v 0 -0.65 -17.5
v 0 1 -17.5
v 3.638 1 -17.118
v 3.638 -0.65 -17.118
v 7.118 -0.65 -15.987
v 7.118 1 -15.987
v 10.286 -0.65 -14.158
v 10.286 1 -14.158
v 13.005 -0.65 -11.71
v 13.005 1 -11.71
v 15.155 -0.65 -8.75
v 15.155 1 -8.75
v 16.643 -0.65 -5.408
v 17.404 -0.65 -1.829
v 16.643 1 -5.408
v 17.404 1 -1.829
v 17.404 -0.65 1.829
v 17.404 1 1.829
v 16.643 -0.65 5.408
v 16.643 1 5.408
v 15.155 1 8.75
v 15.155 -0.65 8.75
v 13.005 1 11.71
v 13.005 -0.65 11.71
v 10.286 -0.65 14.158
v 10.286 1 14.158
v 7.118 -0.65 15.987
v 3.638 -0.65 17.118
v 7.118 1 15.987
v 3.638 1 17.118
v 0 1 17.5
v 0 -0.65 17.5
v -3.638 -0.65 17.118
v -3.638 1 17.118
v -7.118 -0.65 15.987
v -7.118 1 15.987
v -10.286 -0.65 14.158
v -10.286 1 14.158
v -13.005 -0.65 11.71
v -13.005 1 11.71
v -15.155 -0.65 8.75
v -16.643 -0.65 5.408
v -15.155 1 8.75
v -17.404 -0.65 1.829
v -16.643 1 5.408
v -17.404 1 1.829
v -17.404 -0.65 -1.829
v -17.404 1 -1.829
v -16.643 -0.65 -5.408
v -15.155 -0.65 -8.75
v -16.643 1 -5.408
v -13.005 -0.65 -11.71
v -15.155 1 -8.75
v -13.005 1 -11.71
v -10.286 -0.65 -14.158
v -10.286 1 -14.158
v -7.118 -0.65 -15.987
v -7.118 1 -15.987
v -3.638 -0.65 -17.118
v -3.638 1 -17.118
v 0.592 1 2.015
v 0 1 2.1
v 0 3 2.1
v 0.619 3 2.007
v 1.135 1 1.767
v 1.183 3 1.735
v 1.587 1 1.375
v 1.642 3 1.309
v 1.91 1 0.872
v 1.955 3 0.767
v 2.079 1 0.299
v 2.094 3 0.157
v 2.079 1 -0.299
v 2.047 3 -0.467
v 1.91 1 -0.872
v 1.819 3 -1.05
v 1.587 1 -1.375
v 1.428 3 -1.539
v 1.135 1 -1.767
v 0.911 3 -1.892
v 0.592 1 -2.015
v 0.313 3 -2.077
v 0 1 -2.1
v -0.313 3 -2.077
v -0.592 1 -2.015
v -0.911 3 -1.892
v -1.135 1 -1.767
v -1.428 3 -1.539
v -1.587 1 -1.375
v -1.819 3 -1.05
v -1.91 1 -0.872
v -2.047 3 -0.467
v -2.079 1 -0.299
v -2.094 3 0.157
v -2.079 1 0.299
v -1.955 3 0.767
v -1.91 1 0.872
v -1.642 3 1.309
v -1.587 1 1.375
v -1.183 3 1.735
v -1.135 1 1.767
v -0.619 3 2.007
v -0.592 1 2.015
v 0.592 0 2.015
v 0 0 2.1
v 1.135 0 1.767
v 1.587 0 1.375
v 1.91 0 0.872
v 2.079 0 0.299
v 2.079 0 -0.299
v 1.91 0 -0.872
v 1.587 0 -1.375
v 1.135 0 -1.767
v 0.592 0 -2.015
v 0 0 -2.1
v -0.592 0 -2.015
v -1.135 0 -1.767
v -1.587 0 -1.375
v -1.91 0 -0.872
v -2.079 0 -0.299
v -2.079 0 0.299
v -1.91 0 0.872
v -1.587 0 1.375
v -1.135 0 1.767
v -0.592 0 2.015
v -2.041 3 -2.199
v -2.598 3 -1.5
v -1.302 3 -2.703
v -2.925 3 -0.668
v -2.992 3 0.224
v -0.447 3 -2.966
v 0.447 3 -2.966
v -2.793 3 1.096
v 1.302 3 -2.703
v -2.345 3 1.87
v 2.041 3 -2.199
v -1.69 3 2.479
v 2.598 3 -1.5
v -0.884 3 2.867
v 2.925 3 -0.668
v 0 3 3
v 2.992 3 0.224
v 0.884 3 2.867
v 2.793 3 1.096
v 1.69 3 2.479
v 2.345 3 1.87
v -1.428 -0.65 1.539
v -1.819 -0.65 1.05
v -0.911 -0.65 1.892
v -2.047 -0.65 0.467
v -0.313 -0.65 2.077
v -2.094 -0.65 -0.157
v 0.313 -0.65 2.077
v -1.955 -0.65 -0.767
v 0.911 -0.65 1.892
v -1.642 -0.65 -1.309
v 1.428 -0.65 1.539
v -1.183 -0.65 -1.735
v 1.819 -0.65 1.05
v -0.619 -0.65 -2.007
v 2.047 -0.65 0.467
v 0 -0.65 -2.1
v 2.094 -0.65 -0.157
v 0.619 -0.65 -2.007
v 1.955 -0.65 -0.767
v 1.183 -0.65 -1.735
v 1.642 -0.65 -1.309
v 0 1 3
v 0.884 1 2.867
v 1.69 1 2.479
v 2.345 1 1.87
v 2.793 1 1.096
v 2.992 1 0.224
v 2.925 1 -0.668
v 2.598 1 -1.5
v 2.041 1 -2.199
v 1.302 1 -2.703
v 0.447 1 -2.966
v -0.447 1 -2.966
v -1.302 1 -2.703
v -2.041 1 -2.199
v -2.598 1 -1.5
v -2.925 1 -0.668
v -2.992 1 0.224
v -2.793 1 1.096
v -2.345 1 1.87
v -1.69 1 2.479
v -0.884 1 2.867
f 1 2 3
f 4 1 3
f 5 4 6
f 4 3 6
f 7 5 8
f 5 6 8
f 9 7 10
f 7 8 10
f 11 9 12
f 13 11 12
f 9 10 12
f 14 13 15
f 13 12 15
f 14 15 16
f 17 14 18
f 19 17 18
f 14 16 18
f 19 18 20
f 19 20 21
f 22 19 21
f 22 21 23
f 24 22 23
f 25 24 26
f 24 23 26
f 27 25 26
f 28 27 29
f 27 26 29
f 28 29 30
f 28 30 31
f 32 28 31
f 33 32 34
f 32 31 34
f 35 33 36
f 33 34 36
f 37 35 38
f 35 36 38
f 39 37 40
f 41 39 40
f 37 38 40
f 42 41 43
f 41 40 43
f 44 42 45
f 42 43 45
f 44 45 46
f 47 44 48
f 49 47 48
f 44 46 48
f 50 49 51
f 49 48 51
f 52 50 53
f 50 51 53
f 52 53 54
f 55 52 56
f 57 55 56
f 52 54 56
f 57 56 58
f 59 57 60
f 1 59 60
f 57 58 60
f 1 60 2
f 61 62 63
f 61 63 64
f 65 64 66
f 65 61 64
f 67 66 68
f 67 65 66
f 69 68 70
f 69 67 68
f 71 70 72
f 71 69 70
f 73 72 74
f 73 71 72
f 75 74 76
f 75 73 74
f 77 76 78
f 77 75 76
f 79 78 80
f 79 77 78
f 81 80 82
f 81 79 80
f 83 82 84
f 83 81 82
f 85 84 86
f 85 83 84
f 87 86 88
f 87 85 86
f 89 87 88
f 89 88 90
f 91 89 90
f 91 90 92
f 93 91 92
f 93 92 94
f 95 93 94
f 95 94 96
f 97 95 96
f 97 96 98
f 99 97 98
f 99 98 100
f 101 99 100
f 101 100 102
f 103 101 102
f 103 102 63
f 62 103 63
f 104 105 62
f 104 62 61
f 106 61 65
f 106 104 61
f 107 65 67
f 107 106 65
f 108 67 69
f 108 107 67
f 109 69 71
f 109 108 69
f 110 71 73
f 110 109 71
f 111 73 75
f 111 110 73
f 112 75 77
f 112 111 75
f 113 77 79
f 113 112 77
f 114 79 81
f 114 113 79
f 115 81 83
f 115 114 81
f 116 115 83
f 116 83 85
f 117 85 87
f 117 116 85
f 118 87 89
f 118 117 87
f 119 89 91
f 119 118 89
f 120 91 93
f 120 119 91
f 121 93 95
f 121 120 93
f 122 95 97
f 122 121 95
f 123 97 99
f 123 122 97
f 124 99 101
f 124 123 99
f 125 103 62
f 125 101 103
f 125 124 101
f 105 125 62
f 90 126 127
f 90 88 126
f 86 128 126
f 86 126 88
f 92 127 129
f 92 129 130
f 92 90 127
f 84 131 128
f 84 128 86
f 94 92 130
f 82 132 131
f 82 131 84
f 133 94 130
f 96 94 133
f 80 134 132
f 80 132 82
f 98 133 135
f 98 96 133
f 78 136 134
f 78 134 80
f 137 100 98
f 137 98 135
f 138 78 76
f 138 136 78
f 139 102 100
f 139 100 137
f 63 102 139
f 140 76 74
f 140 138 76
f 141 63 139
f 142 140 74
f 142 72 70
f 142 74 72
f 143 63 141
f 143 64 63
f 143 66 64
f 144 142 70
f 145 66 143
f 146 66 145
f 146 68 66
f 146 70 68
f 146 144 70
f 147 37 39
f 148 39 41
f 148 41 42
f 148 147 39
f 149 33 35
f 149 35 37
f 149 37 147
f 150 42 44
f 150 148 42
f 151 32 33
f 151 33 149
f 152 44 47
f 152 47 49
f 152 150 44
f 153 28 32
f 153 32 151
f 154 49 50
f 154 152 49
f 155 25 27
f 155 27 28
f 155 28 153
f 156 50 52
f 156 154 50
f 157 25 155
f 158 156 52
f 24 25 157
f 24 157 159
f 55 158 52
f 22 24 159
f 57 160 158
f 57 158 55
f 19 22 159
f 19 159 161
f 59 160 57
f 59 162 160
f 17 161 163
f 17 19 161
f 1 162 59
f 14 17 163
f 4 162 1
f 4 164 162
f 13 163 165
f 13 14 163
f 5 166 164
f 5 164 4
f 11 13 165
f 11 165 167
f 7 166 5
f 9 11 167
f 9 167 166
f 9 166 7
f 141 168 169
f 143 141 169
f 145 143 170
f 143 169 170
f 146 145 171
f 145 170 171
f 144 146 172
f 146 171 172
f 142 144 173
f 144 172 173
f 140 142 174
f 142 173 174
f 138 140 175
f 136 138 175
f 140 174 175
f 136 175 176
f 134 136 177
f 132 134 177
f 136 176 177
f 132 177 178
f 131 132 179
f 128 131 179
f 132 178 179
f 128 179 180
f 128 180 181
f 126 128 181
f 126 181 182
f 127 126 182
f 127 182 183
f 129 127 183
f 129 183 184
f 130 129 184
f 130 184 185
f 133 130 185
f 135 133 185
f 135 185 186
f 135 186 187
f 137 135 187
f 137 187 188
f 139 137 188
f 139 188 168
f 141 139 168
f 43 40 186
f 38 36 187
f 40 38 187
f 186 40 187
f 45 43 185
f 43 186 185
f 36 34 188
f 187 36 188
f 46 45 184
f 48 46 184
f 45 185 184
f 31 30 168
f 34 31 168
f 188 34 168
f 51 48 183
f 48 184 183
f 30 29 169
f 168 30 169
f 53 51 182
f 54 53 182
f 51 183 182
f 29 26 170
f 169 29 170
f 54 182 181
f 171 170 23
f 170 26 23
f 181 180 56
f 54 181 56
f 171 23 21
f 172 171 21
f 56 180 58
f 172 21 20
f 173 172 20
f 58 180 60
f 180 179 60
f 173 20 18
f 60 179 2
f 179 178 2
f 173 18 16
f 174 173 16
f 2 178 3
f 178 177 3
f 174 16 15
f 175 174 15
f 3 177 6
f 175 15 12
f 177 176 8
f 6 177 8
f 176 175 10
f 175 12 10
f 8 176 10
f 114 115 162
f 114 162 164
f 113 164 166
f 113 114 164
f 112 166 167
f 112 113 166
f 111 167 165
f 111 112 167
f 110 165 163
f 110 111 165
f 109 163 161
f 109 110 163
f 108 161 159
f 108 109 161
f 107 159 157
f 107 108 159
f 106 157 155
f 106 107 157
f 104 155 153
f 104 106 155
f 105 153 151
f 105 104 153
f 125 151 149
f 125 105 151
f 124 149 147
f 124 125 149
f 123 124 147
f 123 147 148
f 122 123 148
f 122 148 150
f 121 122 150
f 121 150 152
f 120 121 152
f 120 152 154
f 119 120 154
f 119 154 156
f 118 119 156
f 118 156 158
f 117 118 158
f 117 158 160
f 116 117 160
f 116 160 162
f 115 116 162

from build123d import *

# Parameters (mm, degrees)
SKETCH_1_R           = 3
SKETCH_1_R_2         = 2.1
EXTRUDE_1_DEPTH      = 3
EXTRUDE_2_DEPTH      = 0.65
EXTRUDE_2_DEPTH_BACK = 1
SKETCH_2_R           = 17.5
SKETCH_2_R_2         = 2.1


with BuildPart() as part:
    # ｽｹｯﾁ1 → ﾎﾞｽ - 押し出し1 (new body)
    with BuildSketch(Plane(origin=(0, 0, 0), x_dir=(1, 0, 0), z_dir=(0, 1, 0))):
        with Locations(Location((0, 0, 0), (0, 0, 270))):
            Circle(SKETCH_1_R)
        with Locations(Location((0, 0, 0), (0, 0, 270))):
            Circle(SKETCH_1_R_2, mode=Mode.SUBTRACT)
    extrude(amount=EXTRUDE_1_DEPTH)

    # ｽｹｯﾁ2 → ﾎﾞｽ - 押し出し2 (add, two sides: drawn at the far end of the back side and taken through both)
    with BuildSketch(Plane.XZ.offset(-EXTRUDE_2_DEPTH_BACK)):
        with Locations(Location((0, 0, 0), (0, 0, 270))):
            Circle(SKETCH_2_R)
        with Locations(Location((0, 0, 0), (0, 0, 270))):
            Circle(SKETCH_2_R_2, mode=Mode.SUBTRACT)
    extrude(amount=EXTRUDE_2_DEPTH + EXTRUDE_2_DEPTH_BACK)


solid = part.part
